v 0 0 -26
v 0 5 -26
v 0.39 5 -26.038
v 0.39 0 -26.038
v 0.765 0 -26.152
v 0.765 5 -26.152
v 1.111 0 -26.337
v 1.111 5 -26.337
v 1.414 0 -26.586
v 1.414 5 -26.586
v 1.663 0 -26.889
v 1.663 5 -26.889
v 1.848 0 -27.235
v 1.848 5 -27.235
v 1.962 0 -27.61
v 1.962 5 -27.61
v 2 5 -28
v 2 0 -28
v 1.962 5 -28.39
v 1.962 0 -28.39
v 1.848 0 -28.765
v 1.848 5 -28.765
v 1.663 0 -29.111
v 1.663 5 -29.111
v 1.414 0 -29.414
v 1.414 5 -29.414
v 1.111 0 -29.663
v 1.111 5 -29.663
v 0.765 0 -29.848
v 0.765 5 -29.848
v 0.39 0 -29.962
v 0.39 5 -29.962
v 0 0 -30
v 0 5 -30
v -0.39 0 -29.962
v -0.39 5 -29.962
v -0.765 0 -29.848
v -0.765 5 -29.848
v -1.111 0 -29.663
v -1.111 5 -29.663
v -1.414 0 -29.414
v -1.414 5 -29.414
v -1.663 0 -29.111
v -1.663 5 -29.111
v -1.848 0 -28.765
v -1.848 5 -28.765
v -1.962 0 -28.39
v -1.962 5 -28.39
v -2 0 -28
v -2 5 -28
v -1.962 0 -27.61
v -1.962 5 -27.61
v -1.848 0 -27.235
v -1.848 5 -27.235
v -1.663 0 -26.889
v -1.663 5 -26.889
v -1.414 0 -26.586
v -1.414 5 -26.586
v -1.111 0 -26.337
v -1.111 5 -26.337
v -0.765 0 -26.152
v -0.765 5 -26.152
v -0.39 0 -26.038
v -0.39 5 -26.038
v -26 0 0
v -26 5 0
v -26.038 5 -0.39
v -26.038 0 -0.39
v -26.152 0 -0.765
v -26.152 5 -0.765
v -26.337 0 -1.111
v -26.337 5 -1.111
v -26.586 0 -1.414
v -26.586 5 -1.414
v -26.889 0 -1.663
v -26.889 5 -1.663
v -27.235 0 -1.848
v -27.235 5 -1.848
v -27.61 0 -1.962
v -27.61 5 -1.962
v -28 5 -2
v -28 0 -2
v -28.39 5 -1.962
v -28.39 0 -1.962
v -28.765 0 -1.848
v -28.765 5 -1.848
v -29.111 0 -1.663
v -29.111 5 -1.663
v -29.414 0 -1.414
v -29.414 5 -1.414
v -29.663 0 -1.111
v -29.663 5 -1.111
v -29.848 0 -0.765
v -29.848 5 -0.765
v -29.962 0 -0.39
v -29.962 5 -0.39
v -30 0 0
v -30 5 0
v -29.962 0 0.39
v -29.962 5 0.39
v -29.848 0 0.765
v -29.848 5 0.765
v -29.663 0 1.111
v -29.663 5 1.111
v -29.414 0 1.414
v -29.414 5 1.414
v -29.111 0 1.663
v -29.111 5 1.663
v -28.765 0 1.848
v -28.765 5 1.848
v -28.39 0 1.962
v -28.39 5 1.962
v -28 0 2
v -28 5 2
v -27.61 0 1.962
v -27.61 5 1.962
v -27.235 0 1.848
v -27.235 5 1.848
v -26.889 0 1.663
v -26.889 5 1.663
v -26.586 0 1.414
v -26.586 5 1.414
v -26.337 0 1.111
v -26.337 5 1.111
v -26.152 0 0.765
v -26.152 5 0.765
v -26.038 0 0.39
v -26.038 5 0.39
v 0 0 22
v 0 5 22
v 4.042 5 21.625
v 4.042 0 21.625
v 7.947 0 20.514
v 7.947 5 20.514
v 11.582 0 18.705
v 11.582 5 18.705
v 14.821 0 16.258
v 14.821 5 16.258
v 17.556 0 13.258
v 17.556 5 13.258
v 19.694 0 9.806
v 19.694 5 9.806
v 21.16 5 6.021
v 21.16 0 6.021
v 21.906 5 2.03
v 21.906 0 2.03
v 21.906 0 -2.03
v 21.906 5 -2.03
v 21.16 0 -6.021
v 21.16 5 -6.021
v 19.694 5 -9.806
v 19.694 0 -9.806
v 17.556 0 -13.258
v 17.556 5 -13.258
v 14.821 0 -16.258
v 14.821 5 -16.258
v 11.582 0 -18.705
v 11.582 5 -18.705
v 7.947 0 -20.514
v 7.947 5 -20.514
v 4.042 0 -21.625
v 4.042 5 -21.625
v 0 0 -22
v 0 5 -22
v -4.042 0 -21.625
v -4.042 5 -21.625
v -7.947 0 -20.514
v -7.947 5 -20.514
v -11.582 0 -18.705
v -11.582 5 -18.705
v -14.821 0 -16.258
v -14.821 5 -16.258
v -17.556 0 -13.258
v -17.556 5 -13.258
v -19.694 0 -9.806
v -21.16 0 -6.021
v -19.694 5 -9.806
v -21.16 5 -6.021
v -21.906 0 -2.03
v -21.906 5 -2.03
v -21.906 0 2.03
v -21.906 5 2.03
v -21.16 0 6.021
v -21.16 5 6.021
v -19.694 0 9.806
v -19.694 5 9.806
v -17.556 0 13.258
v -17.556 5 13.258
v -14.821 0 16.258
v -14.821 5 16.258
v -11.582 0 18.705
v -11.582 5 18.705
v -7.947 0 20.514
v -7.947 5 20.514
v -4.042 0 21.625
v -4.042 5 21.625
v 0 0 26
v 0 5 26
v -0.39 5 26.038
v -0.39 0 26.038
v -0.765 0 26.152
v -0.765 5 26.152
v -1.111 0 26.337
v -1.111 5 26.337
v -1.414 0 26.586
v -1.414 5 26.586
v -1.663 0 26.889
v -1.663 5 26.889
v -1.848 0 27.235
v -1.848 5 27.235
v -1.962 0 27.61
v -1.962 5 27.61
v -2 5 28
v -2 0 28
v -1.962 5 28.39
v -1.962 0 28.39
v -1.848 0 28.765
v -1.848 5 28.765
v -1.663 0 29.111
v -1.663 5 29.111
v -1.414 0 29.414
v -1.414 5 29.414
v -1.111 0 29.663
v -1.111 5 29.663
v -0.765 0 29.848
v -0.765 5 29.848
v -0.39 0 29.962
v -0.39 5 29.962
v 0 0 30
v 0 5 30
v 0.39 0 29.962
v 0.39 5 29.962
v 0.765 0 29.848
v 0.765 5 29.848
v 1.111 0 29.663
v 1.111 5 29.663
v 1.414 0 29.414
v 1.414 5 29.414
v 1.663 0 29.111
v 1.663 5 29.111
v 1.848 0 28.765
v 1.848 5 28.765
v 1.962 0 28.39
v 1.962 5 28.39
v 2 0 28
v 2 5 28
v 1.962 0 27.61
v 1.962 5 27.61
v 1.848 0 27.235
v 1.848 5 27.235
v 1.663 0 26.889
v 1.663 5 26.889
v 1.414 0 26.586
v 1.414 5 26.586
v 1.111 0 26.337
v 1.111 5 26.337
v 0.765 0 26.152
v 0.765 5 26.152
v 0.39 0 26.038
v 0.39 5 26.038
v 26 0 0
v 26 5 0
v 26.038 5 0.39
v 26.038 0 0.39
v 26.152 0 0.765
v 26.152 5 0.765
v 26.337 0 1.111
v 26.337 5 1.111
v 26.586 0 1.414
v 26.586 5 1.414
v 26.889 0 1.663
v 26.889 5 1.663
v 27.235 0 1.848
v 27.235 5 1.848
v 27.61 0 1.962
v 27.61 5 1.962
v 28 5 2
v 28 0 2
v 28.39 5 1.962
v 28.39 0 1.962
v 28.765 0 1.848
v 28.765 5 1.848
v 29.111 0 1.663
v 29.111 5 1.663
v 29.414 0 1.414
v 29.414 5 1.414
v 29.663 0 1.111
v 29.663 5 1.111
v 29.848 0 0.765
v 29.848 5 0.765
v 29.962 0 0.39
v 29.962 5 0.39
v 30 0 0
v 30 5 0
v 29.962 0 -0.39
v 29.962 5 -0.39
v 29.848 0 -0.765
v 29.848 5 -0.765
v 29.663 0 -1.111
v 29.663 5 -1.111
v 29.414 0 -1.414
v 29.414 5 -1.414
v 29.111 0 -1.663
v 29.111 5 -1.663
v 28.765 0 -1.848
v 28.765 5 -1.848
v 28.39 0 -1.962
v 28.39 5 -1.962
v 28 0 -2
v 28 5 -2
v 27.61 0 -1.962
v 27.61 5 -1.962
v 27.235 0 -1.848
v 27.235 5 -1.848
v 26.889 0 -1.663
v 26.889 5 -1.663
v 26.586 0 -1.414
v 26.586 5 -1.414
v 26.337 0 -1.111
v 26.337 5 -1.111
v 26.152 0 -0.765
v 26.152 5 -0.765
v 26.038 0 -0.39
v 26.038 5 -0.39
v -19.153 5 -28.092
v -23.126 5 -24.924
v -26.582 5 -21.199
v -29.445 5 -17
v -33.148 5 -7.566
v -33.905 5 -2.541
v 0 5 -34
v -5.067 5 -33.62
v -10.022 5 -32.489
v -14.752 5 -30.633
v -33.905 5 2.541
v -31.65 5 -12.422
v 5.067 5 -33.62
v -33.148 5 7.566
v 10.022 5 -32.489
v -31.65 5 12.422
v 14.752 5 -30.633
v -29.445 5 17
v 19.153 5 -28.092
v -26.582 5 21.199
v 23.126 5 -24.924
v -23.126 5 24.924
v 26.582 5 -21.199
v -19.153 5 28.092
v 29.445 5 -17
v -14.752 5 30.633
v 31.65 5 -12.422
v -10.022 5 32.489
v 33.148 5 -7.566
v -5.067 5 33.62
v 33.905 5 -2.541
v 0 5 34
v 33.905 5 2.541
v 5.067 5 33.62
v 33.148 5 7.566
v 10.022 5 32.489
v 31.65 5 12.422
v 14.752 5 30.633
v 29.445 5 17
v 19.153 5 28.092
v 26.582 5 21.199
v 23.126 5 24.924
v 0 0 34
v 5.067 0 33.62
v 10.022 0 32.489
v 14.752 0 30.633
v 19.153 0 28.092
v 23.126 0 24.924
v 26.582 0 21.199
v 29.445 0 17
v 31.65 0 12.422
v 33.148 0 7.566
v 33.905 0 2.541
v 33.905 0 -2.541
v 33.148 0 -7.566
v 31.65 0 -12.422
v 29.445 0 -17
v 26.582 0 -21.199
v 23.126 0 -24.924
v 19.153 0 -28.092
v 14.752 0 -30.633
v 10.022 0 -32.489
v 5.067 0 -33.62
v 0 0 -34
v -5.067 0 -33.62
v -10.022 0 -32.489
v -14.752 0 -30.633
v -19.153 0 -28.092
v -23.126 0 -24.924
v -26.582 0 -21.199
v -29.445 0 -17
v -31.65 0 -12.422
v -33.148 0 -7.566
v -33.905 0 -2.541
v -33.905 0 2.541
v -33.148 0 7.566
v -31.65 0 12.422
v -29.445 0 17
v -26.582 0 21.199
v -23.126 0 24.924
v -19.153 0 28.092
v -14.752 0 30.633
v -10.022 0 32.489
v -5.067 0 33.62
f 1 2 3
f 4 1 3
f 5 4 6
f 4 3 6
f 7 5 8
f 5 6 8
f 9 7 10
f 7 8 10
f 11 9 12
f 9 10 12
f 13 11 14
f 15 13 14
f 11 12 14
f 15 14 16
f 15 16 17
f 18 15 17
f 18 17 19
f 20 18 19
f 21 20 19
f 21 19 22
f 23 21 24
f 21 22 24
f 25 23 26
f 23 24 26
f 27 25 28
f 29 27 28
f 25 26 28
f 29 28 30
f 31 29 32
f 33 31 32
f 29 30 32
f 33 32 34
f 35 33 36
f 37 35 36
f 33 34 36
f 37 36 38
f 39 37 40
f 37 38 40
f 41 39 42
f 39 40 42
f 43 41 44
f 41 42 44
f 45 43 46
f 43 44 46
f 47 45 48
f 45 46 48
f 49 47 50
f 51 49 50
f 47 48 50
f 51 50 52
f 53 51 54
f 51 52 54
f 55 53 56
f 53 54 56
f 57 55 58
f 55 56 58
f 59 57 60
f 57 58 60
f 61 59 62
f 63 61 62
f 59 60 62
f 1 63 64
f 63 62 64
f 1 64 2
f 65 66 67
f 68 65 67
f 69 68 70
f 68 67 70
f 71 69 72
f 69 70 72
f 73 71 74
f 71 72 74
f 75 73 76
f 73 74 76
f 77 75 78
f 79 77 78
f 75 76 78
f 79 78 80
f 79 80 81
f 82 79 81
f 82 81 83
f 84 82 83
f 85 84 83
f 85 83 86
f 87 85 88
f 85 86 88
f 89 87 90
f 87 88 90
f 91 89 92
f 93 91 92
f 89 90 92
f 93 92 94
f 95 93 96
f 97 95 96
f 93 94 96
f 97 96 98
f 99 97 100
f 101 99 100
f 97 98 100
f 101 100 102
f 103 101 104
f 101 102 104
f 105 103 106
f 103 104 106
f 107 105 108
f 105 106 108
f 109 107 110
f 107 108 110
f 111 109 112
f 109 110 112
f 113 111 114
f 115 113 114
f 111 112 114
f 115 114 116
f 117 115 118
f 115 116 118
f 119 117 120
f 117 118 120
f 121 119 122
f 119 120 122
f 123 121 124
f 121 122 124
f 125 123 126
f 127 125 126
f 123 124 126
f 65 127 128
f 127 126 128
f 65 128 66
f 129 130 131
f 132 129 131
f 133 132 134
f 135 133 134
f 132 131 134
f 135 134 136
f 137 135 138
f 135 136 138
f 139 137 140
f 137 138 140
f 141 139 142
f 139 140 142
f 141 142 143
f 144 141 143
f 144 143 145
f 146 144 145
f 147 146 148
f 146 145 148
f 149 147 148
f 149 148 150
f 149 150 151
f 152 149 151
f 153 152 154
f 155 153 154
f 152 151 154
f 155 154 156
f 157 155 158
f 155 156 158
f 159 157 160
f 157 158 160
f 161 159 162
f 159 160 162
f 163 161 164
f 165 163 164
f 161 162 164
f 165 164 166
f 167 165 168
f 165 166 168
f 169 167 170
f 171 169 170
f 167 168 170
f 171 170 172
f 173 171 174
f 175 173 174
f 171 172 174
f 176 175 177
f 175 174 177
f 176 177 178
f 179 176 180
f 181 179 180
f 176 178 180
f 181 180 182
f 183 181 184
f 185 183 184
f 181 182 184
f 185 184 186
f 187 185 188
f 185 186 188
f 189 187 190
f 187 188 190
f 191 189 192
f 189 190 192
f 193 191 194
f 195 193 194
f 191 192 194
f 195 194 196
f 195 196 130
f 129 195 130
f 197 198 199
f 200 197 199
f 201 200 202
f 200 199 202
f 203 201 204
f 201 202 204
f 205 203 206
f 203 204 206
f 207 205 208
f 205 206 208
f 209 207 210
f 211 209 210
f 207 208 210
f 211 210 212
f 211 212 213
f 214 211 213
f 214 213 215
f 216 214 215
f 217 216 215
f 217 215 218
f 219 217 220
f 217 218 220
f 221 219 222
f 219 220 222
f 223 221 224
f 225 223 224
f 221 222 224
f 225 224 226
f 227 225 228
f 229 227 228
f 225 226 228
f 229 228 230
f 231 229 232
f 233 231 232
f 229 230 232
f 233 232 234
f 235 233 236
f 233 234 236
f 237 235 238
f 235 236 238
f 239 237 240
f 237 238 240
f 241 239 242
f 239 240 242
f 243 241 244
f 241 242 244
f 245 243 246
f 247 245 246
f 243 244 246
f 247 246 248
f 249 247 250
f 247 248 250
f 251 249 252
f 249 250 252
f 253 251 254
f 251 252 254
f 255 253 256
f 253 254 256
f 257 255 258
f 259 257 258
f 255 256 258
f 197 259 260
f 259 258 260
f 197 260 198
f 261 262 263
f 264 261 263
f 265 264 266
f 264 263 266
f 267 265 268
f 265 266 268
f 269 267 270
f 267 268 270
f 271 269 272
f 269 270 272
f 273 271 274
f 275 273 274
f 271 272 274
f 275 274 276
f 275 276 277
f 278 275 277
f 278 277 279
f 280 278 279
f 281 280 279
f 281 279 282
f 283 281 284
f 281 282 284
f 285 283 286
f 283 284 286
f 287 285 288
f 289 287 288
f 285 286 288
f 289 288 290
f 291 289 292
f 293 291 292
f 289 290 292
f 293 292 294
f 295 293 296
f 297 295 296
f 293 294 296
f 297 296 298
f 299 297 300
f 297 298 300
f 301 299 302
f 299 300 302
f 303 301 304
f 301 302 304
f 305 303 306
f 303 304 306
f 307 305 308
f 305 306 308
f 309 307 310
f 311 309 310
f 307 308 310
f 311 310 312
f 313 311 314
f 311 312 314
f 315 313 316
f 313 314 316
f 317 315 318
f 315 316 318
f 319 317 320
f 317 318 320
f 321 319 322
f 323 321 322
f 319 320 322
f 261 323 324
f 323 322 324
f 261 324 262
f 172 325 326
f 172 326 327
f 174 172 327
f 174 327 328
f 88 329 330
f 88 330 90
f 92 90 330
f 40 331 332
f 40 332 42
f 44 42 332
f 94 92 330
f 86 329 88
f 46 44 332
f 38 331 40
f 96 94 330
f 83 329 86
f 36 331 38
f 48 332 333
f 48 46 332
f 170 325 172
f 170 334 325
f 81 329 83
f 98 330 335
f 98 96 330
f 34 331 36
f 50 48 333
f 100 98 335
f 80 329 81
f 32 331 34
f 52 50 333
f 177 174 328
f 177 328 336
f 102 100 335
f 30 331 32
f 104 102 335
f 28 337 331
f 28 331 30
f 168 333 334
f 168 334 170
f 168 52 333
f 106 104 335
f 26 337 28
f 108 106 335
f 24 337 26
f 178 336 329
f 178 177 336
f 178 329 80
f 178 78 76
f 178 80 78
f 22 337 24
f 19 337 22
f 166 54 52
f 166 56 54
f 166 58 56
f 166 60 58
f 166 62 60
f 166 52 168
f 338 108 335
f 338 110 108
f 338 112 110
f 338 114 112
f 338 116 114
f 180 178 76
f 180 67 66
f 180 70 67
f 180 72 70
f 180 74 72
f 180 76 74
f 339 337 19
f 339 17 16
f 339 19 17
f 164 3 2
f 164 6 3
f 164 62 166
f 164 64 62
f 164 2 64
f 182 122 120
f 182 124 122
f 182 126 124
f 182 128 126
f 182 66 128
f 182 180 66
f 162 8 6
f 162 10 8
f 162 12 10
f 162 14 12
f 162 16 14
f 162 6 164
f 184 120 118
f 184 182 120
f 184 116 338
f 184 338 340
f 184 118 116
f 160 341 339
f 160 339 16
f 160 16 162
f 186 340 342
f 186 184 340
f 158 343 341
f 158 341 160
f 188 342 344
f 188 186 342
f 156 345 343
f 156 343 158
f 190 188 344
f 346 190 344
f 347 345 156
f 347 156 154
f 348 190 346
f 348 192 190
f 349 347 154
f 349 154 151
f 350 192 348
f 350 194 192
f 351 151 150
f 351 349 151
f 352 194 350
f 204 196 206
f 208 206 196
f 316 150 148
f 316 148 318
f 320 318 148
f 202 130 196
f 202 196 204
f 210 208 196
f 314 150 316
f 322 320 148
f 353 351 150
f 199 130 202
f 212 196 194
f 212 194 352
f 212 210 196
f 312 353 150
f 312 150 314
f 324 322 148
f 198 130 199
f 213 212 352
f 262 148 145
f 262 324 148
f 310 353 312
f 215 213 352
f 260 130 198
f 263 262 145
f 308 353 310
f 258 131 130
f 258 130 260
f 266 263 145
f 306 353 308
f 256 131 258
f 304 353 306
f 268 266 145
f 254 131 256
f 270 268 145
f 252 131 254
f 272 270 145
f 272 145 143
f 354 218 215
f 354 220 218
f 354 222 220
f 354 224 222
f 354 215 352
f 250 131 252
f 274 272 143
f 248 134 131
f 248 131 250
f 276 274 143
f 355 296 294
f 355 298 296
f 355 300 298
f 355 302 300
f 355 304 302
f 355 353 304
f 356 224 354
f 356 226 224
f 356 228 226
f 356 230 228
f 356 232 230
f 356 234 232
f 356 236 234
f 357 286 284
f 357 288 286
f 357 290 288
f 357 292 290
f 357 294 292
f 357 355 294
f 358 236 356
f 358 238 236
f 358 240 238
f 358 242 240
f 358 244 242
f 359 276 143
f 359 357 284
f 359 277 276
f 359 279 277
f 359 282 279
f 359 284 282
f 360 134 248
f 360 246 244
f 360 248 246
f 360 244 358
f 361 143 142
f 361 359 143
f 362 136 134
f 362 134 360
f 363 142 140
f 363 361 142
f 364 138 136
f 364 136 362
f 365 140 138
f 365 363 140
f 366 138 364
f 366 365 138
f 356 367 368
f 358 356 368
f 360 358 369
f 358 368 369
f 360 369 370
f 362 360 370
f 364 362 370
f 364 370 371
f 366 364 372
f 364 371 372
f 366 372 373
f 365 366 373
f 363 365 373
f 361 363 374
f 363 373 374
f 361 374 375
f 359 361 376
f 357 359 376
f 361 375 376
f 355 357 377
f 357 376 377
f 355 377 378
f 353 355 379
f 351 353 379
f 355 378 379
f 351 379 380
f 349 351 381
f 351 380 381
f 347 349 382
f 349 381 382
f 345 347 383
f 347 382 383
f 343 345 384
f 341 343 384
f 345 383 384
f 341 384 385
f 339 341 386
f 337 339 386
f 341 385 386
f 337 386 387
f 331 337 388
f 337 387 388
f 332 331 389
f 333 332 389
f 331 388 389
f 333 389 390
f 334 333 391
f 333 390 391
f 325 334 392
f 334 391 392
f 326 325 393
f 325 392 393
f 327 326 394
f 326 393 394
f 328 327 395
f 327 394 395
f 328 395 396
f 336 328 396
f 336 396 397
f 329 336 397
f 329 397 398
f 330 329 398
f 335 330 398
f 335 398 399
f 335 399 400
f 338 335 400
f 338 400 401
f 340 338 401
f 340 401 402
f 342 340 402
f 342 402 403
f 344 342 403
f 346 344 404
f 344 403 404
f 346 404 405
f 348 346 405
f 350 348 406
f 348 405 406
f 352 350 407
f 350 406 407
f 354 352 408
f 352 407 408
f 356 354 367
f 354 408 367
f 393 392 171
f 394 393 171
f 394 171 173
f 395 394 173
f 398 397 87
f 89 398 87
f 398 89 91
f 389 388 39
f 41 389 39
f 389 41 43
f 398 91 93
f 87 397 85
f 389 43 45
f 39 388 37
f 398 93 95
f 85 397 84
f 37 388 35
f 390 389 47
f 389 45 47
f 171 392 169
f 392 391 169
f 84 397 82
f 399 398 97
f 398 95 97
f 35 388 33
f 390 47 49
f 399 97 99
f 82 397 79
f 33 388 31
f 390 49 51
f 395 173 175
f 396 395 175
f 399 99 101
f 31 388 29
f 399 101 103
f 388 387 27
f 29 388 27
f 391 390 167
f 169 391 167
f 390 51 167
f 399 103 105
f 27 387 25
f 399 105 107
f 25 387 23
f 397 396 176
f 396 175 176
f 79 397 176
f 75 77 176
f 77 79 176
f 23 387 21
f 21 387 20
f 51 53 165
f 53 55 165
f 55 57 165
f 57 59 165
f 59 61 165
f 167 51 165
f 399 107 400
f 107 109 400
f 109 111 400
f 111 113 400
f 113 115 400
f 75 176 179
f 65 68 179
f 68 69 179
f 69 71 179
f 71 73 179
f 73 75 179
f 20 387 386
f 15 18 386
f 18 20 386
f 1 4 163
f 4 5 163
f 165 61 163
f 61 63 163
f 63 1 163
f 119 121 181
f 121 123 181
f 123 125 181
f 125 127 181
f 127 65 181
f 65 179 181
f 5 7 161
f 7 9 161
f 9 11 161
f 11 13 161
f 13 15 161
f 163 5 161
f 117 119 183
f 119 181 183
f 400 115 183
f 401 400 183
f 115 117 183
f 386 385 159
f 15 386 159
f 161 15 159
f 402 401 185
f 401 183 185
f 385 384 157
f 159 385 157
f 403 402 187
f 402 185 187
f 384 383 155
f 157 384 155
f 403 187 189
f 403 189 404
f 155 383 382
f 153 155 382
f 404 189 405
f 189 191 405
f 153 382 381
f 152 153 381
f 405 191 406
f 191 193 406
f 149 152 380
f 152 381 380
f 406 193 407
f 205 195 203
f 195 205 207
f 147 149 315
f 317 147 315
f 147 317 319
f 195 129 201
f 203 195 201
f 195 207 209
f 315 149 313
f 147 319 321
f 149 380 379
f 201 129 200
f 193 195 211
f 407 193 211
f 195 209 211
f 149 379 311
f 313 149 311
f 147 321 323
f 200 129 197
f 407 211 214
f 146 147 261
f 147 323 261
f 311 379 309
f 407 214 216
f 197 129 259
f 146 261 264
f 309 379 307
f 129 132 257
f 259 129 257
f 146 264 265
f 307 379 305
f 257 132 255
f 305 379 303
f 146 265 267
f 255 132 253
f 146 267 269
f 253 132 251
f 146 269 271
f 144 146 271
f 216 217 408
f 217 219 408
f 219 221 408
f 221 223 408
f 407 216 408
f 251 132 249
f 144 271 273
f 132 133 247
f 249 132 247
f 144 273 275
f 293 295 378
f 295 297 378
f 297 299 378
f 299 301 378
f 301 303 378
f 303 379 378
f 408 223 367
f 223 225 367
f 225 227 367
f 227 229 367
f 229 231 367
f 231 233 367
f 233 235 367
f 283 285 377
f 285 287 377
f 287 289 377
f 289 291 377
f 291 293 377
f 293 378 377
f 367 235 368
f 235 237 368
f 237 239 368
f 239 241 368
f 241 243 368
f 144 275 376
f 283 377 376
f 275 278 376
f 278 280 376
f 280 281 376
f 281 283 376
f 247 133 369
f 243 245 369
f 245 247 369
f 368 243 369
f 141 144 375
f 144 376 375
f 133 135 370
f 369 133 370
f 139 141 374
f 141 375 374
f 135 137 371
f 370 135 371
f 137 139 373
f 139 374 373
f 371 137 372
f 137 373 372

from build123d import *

# Parameters (mm, degrees)
SKETCH_1_R               = 34
EXTRUDE_1_DEPTH          = 5
SKETCH_2_R               = 22
CUT_EXTRUDE_1_DEPTH      = 5
SKETCH_3_R               = 2
CUT_EXTRUDE_2_DEPTH      = 5
PATTERN_CIRCULAR_1_COUNT = 4


with BuildPart() as part:
    # 草图1 → 凸台-拉伸1 (new body)
    with BuildSketch(Plane(origin=(0, 0, 0), x_dir=(1, 0, 0), z_dir=(0, 1, 0))):
        with Locations(Location((0, 0, 0), (0, 0, 270))):
            Circle(SKETCH_1_R)
    extrude(amount=EXTRUDE_1_DEPTH)

    # 草图2 → 切除-拉伸1 (cut)
    with BuildSketch(Plane(origin=(0, 5, 0), x_dir=(1, 0, 0), z_dir=(0, 1, 0))):
        with Locations(Location((0, 0, 0), (0, 0, 270))):
            Circle(SKETCH_2_R)
    extrude(amount=-CUT_EXTRUDE_1_DEPTH, mode=Mode.SUBTRACT)

    # 草图3 → 切除-拉伸2 (cut)
    with BuildSketch(Plane(origin=(0, 5, 0), x_dir=(1, 0, 0), z_dir=(0, 1, 0))):
        with Locations(Location((0, 28, 0), (0, 0, 270))):
            Circle(SKETCH_3_R)
    cut_extrude_2 = extrude(amount=-CUT_EXTRUDE_2_DEPTH, mode=Mode.SUBTRACT)

    # 阵列(圆周)1: 切除-拉伸2 ×4 about axis
    pattern_circular_1_axis = Axis((0, 0, 0), (0, 1, 0))
    for i in range(1, PATTERN_CIRCULAR_1_COUNT):
        add(cut_extrude_2.rotate(pattern_circular_1_axis, i * 360 / PATTERN_CIRCULAR_1_COUNT), mode=Mode.SUBTRACT)


solid = part.part
